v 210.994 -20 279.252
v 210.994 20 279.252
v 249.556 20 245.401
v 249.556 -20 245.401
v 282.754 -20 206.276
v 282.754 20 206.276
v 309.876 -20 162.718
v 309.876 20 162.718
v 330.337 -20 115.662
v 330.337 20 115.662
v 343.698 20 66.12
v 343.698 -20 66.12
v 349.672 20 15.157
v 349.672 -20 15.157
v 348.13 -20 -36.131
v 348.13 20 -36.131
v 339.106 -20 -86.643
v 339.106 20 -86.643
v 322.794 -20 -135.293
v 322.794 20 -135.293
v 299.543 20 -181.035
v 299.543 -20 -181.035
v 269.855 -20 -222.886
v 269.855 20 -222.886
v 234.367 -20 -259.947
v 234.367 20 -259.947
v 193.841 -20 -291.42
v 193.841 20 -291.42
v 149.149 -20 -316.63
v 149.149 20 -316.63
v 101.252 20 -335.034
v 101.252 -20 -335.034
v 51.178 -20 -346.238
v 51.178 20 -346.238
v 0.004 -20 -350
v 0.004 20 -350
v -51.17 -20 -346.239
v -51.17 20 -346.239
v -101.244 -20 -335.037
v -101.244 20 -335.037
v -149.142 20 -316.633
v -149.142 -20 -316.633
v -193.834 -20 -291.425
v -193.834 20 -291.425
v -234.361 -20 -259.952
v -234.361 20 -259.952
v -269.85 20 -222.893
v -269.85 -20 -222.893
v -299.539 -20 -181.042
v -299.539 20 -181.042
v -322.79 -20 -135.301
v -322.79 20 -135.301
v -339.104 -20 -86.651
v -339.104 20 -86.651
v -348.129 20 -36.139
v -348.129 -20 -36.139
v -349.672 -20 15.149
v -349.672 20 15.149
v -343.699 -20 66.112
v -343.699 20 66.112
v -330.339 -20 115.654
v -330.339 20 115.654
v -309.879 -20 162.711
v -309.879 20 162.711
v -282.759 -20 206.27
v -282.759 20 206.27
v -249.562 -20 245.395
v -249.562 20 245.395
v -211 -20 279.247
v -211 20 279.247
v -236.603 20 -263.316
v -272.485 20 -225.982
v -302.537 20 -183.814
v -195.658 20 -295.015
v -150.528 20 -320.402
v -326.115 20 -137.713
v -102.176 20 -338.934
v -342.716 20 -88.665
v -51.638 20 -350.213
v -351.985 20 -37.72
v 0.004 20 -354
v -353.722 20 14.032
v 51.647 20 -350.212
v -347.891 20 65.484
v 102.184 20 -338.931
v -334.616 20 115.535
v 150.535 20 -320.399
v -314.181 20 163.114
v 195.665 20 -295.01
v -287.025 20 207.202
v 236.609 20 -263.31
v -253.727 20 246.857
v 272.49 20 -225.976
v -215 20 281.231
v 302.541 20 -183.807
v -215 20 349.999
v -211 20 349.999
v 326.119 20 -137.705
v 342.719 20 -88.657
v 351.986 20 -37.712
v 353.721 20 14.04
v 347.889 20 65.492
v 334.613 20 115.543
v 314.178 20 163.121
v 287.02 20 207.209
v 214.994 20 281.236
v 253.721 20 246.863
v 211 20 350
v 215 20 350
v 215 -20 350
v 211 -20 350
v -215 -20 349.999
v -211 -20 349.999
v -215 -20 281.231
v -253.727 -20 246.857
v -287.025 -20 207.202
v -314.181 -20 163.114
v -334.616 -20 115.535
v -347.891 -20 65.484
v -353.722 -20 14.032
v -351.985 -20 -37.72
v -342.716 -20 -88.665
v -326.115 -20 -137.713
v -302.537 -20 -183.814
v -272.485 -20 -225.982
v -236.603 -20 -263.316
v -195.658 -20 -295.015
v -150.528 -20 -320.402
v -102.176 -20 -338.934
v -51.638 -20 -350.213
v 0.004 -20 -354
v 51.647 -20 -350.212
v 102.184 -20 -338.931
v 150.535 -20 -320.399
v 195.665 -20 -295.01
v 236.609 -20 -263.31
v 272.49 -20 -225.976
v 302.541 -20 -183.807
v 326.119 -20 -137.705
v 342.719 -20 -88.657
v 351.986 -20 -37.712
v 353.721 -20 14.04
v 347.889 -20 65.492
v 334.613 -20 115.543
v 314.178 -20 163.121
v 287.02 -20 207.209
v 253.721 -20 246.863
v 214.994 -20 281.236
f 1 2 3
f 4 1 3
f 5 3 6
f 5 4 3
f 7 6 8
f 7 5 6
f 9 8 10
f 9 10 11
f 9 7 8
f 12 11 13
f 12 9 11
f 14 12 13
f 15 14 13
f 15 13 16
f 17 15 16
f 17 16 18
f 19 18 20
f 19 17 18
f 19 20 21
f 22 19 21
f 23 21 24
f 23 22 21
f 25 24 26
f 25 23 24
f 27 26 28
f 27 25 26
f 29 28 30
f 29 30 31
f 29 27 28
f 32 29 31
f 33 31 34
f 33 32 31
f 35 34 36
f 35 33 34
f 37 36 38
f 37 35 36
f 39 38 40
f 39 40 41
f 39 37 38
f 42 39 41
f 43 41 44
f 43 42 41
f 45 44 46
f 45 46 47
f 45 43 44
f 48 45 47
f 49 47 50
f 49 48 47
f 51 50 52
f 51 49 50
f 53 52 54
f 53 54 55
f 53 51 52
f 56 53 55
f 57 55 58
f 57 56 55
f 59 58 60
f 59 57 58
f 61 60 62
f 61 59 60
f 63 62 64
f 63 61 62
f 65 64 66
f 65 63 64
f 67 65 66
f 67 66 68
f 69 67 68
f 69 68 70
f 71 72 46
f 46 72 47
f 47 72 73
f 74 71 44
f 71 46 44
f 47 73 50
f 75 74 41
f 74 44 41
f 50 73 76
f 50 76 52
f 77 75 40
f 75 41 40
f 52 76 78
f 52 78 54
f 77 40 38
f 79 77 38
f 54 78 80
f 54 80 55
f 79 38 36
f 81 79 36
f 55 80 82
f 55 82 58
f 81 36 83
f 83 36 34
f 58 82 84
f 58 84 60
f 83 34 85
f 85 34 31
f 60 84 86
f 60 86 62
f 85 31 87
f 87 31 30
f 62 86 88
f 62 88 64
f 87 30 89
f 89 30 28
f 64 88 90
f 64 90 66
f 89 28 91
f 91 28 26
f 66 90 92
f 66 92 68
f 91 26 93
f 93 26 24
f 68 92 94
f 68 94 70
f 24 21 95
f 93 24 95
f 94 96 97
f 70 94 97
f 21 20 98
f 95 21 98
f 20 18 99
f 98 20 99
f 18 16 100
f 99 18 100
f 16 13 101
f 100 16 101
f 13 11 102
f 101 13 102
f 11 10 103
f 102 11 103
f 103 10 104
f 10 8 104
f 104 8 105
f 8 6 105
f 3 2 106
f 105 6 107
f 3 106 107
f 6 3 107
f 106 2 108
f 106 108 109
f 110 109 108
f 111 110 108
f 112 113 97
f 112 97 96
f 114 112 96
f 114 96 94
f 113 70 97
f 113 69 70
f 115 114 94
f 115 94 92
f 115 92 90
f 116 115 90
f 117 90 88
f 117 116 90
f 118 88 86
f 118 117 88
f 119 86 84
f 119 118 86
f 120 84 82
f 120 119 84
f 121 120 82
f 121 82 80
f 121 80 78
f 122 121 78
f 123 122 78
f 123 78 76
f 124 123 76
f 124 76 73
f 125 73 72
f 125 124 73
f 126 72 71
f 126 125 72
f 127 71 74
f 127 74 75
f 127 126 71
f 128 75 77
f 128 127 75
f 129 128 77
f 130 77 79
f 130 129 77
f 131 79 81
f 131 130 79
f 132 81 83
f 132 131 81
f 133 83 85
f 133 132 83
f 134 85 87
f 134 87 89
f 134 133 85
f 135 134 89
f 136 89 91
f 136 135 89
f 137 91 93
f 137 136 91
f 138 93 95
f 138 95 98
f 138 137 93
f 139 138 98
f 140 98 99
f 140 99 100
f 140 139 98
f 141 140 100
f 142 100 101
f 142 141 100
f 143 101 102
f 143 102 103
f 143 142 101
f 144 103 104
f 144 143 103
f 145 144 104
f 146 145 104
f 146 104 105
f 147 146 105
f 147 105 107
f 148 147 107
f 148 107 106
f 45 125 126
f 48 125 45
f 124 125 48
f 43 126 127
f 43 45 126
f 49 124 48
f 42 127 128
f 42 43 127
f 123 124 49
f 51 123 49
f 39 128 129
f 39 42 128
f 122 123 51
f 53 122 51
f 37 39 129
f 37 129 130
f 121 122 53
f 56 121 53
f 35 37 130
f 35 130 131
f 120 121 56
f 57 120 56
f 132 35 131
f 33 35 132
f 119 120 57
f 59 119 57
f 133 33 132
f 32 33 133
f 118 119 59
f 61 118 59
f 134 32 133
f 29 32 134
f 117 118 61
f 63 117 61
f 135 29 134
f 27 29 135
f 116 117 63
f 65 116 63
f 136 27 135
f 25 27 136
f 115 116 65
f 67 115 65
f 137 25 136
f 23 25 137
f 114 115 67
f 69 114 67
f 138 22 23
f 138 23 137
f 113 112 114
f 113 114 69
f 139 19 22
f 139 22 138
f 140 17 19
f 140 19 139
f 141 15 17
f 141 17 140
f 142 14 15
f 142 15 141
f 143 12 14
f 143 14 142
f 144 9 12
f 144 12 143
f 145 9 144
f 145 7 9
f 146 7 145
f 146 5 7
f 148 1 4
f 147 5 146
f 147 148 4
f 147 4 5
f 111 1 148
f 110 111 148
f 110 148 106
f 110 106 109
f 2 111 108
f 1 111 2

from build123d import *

# Parameters (mm, degrees)
F1_DEPTH = 20


with BuildPart() as f1:
    # F0 (on Front) → F1 (new body, symmetric)
    with BuildSketch(Plane.XZ):
        with BuildLine():
            Line((-211.000333, 279.24695), (-211.000333, 349.999326))
            Line((-211.000333, 349.999326), (-215.000333, 349.999326))
            Line((-215.000333, 349.999326), (-215.000333, 281.230967))
            ThreePointArc((-215.000333, 281.230967), (0.004068, -354), (214.993869, 281.235908))
            Line((214.993869, 281.235908), (214.999667, 349.999663))
            Line((214.999667, 349.999663), (210.999667, 350))
            Line((210.999667, 350), (210.993702, 279.251961))
            ThreePointArc((210.993702, 279.251961), (0.004156, -350), (-211.000333, 279.24695))
        make_face()
    extrude(amount=F1_DEPTH, both=True)


solid = f1.part
